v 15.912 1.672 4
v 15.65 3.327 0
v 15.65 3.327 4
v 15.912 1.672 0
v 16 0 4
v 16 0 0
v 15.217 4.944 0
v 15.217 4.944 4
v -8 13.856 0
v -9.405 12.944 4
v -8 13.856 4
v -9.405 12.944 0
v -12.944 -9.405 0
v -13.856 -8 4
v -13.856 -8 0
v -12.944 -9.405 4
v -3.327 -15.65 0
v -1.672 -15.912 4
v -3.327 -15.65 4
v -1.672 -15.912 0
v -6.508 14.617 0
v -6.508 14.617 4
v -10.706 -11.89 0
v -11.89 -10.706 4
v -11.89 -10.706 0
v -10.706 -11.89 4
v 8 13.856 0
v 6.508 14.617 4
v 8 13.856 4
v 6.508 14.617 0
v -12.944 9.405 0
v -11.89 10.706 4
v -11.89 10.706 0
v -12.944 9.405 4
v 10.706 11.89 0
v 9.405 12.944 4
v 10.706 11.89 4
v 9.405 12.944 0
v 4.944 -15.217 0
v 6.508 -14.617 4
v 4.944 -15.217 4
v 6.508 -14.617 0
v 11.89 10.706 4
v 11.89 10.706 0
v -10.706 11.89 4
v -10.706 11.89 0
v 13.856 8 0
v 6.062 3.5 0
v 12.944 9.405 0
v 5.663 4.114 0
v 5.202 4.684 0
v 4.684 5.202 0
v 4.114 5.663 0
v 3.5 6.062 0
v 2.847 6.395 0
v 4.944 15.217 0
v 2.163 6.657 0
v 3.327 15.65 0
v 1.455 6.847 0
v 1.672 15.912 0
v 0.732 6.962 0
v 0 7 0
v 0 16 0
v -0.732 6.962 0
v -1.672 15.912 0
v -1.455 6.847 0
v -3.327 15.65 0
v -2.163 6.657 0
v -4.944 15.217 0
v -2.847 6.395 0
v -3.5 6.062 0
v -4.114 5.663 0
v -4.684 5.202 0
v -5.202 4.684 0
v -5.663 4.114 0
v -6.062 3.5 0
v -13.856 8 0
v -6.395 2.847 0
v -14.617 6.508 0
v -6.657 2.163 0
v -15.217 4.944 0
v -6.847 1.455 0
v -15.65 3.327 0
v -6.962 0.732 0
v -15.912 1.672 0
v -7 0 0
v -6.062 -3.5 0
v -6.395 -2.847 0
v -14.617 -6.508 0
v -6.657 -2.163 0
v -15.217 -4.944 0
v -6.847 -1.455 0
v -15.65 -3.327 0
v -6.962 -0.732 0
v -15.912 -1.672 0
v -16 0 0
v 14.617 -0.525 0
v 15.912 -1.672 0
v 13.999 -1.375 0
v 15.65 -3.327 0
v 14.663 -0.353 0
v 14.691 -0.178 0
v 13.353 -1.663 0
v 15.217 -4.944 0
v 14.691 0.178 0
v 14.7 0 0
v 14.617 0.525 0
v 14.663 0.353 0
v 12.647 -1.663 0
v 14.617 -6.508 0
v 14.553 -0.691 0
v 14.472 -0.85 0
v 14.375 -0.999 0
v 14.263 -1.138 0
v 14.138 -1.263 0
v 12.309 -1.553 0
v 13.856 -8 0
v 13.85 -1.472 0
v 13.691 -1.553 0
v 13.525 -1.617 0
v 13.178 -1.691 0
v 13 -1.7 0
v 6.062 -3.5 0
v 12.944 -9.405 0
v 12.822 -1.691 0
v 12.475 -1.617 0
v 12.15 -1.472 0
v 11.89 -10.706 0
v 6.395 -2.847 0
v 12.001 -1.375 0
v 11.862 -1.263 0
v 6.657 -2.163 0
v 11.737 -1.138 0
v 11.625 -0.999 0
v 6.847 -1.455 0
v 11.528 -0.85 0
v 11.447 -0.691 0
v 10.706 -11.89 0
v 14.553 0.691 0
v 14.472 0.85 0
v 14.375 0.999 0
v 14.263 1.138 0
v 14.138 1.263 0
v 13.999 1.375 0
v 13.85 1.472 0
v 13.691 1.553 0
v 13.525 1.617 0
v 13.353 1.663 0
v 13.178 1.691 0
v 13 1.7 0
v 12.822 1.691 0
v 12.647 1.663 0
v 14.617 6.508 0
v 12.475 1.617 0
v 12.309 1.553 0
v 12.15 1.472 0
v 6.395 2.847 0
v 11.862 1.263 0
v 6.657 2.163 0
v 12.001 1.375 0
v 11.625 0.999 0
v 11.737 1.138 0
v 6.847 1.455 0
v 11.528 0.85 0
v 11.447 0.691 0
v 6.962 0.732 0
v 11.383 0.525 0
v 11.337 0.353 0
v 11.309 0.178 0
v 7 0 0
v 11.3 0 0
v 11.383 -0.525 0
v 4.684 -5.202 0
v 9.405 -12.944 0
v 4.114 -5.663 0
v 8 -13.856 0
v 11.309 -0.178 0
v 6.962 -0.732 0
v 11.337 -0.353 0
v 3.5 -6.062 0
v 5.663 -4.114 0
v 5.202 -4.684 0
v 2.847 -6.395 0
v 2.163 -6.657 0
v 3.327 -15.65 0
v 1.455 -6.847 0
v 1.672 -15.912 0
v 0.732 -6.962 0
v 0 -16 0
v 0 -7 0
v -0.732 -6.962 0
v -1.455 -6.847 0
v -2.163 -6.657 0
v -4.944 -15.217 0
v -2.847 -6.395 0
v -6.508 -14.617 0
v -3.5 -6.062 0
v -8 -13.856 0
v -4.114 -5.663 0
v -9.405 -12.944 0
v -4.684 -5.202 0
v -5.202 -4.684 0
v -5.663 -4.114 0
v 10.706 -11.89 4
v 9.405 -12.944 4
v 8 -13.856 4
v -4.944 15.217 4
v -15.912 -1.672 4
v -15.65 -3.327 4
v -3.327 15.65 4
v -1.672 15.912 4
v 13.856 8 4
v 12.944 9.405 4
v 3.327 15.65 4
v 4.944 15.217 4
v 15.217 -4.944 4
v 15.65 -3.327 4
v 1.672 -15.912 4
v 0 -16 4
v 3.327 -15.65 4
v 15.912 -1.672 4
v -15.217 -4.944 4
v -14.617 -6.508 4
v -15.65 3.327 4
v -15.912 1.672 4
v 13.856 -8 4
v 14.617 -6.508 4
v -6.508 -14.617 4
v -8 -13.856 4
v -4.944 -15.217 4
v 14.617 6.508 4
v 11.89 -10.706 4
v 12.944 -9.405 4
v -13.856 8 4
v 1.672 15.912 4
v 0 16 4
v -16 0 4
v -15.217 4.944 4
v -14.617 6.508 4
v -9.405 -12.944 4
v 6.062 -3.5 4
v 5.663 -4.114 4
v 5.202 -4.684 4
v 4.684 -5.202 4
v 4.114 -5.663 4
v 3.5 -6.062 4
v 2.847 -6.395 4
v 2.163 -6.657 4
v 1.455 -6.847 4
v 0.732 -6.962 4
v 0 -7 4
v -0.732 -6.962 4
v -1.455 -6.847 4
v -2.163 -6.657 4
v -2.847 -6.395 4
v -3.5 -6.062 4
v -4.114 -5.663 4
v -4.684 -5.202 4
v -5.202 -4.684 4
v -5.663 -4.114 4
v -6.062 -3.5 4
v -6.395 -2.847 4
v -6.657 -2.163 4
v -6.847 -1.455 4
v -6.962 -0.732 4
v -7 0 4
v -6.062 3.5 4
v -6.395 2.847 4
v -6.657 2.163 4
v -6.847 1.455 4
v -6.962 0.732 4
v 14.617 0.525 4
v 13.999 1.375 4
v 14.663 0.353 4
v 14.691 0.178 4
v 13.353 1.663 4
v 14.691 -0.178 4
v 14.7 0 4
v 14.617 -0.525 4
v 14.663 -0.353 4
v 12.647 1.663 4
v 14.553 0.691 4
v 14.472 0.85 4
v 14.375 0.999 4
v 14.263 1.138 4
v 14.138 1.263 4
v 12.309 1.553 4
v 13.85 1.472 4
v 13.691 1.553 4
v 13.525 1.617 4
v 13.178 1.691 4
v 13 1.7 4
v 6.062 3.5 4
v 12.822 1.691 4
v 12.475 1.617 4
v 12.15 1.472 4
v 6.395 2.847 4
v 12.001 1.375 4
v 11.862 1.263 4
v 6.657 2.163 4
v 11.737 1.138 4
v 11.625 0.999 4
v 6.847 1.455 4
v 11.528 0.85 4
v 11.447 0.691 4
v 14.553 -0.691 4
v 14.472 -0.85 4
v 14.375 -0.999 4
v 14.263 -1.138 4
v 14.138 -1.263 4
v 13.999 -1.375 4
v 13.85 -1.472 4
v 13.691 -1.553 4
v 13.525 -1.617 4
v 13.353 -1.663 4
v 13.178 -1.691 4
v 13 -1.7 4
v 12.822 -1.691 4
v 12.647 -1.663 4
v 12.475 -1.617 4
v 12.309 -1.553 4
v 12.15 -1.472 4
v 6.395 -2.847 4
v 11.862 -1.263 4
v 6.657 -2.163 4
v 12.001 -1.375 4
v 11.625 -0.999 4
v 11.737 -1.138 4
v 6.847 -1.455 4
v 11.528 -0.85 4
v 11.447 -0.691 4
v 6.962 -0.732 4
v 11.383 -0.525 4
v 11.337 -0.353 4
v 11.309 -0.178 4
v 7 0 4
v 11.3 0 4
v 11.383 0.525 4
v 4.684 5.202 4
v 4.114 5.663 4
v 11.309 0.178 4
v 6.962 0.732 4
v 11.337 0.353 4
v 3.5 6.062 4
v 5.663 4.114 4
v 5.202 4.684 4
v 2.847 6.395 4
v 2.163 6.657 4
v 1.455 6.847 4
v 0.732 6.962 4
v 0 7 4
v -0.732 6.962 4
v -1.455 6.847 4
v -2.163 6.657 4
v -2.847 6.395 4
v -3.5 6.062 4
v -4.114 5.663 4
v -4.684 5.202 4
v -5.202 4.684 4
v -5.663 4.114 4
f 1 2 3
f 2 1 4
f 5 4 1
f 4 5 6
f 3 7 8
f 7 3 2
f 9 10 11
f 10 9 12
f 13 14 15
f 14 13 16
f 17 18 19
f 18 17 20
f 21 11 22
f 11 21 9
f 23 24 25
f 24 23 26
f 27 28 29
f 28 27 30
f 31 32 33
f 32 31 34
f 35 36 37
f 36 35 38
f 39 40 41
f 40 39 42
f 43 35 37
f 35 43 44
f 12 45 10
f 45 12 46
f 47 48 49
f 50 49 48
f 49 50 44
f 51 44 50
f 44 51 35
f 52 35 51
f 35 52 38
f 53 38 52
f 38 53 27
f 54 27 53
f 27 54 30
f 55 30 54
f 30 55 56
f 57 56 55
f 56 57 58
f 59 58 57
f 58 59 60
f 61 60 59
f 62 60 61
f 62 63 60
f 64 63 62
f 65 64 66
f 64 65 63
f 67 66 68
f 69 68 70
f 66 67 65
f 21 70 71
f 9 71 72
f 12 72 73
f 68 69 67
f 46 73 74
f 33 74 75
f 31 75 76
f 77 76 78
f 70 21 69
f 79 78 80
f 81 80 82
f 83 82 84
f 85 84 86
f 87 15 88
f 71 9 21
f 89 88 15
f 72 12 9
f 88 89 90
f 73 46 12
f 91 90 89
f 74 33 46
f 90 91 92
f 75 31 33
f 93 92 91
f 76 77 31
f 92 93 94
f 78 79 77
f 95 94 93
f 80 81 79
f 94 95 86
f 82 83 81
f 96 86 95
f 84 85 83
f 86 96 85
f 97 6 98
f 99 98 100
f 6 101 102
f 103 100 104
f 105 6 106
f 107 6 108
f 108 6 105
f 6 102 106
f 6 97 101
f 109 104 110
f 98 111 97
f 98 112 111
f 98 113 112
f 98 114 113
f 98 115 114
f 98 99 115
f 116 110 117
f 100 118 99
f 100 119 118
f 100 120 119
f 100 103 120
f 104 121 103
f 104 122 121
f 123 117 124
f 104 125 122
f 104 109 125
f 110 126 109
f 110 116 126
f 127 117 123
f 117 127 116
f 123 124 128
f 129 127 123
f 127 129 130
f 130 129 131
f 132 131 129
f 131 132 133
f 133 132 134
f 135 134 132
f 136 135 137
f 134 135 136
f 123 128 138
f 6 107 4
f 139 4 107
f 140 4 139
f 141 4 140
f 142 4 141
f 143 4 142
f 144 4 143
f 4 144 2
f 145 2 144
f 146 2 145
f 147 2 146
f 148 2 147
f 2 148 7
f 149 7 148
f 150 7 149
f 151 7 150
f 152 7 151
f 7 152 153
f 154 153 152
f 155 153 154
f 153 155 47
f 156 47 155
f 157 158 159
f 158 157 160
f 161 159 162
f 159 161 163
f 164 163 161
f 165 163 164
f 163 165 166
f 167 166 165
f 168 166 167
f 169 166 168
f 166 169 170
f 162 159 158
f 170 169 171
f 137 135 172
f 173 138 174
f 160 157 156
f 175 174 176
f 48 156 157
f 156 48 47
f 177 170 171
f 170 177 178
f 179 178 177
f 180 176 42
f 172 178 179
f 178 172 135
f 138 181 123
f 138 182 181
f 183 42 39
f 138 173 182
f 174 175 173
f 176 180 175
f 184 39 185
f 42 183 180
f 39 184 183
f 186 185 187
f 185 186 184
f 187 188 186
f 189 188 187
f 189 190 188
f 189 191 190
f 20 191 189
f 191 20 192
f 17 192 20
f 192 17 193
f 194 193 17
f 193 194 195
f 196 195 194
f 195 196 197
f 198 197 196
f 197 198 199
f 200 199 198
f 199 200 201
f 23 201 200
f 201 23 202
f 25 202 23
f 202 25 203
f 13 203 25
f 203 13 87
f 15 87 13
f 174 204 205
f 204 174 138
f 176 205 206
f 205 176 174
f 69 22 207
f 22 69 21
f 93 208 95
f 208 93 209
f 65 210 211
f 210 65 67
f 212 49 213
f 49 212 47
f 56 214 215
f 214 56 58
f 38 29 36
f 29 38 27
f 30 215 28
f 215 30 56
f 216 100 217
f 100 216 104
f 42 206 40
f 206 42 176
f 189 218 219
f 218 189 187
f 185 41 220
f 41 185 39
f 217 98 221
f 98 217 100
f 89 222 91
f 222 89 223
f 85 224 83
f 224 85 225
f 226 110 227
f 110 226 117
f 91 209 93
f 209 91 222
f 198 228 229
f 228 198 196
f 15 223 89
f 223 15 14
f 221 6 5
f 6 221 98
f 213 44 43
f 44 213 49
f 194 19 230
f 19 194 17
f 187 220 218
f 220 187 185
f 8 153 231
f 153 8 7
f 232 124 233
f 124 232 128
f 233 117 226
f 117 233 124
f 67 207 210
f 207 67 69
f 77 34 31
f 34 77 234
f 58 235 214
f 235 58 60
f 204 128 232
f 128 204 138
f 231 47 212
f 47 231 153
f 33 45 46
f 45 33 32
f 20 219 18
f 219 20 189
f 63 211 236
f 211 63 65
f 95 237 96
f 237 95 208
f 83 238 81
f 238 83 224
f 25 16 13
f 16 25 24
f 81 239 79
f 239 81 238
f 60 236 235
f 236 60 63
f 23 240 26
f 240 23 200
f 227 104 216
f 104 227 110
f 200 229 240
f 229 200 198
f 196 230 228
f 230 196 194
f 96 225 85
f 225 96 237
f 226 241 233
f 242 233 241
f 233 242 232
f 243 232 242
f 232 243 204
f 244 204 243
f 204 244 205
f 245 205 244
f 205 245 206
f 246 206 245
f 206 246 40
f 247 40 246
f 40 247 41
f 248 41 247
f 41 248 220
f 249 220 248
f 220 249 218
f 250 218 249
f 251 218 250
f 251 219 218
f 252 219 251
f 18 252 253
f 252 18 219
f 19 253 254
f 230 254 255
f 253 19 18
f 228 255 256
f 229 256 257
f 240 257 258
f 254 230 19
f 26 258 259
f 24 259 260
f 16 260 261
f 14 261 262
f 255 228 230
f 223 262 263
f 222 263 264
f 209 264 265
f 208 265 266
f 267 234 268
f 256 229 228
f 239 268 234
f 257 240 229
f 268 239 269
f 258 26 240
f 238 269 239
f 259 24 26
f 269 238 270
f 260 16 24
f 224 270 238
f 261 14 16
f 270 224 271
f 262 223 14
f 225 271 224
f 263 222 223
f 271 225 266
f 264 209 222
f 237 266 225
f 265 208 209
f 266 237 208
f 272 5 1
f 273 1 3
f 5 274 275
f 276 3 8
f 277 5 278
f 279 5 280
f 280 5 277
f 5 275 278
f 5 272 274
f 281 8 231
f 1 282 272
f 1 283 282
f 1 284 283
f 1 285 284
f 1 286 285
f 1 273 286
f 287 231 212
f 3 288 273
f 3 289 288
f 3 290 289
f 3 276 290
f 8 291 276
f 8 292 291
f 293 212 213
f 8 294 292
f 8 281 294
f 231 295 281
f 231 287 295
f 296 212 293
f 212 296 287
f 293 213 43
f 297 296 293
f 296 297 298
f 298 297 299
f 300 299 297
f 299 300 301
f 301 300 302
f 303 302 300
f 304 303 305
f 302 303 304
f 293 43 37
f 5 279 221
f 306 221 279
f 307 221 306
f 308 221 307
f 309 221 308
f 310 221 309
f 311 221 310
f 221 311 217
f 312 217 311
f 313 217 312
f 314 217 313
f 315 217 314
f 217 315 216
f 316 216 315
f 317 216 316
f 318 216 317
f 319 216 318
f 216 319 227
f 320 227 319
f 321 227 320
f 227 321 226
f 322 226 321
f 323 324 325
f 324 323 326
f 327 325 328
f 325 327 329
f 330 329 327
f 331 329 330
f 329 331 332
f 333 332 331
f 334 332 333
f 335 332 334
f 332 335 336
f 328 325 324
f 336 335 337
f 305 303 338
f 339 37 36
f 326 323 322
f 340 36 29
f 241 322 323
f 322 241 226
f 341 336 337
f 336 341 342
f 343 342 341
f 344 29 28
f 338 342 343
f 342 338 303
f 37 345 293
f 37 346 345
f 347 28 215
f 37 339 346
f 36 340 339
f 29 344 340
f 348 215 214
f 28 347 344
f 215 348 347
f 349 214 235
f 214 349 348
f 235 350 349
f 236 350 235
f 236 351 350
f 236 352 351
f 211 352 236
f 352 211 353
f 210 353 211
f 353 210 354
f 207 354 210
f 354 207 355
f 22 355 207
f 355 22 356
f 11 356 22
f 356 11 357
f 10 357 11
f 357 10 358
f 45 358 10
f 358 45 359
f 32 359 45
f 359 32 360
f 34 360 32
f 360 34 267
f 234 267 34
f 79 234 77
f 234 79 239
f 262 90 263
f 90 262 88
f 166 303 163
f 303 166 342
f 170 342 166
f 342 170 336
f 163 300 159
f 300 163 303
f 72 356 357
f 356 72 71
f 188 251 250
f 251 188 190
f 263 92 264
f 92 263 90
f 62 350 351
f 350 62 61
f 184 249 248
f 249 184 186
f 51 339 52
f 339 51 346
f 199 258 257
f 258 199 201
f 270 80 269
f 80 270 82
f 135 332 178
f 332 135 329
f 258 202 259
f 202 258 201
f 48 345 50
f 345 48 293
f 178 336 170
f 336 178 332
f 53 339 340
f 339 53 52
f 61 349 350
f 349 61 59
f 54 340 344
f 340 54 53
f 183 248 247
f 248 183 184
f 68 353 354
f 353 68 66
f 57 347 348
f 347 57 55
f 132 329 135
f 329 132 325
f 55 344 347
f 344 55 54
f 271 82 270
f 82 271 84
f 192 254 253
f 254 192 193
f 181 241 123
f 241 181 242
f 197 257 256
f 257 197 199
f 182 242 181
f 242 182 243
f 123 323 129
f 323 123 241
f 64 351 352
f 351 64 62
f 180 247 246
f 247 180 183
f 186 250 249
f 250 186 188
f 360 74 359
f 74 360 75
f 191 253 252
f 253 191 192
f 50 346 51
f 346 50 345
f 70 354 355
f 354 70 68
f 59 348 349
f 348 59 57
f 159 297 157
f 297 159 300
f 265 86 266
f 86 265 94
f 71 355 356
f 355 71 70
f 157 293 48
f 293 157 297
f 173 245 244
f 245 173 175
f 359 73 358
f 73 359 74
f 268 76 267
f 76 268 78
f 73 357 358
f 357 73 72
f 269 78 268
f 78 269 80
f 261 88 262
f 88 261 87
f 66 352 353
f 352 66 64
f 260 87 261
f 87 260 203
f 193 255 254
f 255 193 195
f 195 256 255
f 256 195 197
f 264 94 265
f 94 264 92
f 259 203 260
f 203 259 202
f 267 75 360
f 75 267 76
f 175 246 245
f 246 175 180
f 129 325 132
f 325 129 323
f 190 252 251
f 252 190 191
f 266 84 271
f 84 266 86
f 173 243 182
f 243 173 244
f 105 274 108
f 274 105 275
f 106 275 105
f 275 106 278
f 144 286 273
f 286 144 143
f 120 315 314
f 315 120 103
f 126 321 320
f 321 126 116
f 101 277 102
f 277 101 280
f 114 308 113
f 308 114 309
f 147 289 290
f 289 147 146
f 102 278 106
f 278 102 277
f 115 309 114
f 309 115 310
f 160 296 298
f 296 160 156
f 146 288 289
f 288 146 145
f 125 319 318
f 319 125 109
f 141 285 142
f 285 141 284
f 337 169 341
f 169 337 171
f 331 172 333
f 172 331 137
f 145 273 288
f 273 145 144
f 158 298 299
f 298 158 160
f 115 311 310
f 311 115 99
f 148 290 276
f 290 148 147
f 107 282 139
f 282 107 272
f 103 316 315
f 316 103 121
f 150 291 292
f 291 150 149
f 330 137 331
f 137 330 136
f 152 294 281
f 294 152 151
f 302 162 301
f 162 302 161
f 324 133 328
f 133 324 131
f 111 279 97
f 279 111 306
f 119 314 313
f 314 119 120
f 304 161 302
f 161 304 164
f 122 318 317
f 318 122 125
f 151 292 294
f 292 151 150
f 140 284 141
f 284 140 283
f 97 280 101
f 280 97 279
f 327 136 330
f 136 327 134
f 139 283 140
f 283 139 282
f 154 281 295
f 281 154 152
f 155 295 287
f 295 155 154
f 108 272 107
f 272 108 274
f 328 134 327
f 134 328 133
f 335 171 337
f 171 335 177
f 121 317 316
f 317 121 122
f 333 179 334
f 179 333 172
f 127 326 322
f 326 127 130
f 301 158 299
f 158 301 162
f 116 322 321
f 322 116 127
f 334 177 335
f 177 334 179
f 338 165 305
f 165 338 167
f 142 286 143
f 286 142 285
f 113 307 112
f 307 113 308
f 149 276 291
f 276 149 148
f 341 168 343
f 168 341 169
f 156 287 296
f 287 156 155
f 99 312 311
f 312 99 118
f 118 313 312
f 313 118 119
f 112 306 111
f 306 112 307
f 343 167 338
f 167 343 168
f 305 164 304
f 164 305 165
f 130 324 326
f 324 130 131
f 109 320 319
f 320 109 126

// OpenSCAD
// Closed cable guide ring.
$fn = 60;
eps = 0.02;
cable_d = 14;
outer_d = 32;
thickness = 4;
difference() { cylinder(d=outer_d,h=thickness); translate([0,0,-eps]) cylinder(d=cable_d,h=thickness+2*eps); translate([outer_d/2-3,0,-eps]) cylinder(d=3.4,h=thickness+2*eps); }
